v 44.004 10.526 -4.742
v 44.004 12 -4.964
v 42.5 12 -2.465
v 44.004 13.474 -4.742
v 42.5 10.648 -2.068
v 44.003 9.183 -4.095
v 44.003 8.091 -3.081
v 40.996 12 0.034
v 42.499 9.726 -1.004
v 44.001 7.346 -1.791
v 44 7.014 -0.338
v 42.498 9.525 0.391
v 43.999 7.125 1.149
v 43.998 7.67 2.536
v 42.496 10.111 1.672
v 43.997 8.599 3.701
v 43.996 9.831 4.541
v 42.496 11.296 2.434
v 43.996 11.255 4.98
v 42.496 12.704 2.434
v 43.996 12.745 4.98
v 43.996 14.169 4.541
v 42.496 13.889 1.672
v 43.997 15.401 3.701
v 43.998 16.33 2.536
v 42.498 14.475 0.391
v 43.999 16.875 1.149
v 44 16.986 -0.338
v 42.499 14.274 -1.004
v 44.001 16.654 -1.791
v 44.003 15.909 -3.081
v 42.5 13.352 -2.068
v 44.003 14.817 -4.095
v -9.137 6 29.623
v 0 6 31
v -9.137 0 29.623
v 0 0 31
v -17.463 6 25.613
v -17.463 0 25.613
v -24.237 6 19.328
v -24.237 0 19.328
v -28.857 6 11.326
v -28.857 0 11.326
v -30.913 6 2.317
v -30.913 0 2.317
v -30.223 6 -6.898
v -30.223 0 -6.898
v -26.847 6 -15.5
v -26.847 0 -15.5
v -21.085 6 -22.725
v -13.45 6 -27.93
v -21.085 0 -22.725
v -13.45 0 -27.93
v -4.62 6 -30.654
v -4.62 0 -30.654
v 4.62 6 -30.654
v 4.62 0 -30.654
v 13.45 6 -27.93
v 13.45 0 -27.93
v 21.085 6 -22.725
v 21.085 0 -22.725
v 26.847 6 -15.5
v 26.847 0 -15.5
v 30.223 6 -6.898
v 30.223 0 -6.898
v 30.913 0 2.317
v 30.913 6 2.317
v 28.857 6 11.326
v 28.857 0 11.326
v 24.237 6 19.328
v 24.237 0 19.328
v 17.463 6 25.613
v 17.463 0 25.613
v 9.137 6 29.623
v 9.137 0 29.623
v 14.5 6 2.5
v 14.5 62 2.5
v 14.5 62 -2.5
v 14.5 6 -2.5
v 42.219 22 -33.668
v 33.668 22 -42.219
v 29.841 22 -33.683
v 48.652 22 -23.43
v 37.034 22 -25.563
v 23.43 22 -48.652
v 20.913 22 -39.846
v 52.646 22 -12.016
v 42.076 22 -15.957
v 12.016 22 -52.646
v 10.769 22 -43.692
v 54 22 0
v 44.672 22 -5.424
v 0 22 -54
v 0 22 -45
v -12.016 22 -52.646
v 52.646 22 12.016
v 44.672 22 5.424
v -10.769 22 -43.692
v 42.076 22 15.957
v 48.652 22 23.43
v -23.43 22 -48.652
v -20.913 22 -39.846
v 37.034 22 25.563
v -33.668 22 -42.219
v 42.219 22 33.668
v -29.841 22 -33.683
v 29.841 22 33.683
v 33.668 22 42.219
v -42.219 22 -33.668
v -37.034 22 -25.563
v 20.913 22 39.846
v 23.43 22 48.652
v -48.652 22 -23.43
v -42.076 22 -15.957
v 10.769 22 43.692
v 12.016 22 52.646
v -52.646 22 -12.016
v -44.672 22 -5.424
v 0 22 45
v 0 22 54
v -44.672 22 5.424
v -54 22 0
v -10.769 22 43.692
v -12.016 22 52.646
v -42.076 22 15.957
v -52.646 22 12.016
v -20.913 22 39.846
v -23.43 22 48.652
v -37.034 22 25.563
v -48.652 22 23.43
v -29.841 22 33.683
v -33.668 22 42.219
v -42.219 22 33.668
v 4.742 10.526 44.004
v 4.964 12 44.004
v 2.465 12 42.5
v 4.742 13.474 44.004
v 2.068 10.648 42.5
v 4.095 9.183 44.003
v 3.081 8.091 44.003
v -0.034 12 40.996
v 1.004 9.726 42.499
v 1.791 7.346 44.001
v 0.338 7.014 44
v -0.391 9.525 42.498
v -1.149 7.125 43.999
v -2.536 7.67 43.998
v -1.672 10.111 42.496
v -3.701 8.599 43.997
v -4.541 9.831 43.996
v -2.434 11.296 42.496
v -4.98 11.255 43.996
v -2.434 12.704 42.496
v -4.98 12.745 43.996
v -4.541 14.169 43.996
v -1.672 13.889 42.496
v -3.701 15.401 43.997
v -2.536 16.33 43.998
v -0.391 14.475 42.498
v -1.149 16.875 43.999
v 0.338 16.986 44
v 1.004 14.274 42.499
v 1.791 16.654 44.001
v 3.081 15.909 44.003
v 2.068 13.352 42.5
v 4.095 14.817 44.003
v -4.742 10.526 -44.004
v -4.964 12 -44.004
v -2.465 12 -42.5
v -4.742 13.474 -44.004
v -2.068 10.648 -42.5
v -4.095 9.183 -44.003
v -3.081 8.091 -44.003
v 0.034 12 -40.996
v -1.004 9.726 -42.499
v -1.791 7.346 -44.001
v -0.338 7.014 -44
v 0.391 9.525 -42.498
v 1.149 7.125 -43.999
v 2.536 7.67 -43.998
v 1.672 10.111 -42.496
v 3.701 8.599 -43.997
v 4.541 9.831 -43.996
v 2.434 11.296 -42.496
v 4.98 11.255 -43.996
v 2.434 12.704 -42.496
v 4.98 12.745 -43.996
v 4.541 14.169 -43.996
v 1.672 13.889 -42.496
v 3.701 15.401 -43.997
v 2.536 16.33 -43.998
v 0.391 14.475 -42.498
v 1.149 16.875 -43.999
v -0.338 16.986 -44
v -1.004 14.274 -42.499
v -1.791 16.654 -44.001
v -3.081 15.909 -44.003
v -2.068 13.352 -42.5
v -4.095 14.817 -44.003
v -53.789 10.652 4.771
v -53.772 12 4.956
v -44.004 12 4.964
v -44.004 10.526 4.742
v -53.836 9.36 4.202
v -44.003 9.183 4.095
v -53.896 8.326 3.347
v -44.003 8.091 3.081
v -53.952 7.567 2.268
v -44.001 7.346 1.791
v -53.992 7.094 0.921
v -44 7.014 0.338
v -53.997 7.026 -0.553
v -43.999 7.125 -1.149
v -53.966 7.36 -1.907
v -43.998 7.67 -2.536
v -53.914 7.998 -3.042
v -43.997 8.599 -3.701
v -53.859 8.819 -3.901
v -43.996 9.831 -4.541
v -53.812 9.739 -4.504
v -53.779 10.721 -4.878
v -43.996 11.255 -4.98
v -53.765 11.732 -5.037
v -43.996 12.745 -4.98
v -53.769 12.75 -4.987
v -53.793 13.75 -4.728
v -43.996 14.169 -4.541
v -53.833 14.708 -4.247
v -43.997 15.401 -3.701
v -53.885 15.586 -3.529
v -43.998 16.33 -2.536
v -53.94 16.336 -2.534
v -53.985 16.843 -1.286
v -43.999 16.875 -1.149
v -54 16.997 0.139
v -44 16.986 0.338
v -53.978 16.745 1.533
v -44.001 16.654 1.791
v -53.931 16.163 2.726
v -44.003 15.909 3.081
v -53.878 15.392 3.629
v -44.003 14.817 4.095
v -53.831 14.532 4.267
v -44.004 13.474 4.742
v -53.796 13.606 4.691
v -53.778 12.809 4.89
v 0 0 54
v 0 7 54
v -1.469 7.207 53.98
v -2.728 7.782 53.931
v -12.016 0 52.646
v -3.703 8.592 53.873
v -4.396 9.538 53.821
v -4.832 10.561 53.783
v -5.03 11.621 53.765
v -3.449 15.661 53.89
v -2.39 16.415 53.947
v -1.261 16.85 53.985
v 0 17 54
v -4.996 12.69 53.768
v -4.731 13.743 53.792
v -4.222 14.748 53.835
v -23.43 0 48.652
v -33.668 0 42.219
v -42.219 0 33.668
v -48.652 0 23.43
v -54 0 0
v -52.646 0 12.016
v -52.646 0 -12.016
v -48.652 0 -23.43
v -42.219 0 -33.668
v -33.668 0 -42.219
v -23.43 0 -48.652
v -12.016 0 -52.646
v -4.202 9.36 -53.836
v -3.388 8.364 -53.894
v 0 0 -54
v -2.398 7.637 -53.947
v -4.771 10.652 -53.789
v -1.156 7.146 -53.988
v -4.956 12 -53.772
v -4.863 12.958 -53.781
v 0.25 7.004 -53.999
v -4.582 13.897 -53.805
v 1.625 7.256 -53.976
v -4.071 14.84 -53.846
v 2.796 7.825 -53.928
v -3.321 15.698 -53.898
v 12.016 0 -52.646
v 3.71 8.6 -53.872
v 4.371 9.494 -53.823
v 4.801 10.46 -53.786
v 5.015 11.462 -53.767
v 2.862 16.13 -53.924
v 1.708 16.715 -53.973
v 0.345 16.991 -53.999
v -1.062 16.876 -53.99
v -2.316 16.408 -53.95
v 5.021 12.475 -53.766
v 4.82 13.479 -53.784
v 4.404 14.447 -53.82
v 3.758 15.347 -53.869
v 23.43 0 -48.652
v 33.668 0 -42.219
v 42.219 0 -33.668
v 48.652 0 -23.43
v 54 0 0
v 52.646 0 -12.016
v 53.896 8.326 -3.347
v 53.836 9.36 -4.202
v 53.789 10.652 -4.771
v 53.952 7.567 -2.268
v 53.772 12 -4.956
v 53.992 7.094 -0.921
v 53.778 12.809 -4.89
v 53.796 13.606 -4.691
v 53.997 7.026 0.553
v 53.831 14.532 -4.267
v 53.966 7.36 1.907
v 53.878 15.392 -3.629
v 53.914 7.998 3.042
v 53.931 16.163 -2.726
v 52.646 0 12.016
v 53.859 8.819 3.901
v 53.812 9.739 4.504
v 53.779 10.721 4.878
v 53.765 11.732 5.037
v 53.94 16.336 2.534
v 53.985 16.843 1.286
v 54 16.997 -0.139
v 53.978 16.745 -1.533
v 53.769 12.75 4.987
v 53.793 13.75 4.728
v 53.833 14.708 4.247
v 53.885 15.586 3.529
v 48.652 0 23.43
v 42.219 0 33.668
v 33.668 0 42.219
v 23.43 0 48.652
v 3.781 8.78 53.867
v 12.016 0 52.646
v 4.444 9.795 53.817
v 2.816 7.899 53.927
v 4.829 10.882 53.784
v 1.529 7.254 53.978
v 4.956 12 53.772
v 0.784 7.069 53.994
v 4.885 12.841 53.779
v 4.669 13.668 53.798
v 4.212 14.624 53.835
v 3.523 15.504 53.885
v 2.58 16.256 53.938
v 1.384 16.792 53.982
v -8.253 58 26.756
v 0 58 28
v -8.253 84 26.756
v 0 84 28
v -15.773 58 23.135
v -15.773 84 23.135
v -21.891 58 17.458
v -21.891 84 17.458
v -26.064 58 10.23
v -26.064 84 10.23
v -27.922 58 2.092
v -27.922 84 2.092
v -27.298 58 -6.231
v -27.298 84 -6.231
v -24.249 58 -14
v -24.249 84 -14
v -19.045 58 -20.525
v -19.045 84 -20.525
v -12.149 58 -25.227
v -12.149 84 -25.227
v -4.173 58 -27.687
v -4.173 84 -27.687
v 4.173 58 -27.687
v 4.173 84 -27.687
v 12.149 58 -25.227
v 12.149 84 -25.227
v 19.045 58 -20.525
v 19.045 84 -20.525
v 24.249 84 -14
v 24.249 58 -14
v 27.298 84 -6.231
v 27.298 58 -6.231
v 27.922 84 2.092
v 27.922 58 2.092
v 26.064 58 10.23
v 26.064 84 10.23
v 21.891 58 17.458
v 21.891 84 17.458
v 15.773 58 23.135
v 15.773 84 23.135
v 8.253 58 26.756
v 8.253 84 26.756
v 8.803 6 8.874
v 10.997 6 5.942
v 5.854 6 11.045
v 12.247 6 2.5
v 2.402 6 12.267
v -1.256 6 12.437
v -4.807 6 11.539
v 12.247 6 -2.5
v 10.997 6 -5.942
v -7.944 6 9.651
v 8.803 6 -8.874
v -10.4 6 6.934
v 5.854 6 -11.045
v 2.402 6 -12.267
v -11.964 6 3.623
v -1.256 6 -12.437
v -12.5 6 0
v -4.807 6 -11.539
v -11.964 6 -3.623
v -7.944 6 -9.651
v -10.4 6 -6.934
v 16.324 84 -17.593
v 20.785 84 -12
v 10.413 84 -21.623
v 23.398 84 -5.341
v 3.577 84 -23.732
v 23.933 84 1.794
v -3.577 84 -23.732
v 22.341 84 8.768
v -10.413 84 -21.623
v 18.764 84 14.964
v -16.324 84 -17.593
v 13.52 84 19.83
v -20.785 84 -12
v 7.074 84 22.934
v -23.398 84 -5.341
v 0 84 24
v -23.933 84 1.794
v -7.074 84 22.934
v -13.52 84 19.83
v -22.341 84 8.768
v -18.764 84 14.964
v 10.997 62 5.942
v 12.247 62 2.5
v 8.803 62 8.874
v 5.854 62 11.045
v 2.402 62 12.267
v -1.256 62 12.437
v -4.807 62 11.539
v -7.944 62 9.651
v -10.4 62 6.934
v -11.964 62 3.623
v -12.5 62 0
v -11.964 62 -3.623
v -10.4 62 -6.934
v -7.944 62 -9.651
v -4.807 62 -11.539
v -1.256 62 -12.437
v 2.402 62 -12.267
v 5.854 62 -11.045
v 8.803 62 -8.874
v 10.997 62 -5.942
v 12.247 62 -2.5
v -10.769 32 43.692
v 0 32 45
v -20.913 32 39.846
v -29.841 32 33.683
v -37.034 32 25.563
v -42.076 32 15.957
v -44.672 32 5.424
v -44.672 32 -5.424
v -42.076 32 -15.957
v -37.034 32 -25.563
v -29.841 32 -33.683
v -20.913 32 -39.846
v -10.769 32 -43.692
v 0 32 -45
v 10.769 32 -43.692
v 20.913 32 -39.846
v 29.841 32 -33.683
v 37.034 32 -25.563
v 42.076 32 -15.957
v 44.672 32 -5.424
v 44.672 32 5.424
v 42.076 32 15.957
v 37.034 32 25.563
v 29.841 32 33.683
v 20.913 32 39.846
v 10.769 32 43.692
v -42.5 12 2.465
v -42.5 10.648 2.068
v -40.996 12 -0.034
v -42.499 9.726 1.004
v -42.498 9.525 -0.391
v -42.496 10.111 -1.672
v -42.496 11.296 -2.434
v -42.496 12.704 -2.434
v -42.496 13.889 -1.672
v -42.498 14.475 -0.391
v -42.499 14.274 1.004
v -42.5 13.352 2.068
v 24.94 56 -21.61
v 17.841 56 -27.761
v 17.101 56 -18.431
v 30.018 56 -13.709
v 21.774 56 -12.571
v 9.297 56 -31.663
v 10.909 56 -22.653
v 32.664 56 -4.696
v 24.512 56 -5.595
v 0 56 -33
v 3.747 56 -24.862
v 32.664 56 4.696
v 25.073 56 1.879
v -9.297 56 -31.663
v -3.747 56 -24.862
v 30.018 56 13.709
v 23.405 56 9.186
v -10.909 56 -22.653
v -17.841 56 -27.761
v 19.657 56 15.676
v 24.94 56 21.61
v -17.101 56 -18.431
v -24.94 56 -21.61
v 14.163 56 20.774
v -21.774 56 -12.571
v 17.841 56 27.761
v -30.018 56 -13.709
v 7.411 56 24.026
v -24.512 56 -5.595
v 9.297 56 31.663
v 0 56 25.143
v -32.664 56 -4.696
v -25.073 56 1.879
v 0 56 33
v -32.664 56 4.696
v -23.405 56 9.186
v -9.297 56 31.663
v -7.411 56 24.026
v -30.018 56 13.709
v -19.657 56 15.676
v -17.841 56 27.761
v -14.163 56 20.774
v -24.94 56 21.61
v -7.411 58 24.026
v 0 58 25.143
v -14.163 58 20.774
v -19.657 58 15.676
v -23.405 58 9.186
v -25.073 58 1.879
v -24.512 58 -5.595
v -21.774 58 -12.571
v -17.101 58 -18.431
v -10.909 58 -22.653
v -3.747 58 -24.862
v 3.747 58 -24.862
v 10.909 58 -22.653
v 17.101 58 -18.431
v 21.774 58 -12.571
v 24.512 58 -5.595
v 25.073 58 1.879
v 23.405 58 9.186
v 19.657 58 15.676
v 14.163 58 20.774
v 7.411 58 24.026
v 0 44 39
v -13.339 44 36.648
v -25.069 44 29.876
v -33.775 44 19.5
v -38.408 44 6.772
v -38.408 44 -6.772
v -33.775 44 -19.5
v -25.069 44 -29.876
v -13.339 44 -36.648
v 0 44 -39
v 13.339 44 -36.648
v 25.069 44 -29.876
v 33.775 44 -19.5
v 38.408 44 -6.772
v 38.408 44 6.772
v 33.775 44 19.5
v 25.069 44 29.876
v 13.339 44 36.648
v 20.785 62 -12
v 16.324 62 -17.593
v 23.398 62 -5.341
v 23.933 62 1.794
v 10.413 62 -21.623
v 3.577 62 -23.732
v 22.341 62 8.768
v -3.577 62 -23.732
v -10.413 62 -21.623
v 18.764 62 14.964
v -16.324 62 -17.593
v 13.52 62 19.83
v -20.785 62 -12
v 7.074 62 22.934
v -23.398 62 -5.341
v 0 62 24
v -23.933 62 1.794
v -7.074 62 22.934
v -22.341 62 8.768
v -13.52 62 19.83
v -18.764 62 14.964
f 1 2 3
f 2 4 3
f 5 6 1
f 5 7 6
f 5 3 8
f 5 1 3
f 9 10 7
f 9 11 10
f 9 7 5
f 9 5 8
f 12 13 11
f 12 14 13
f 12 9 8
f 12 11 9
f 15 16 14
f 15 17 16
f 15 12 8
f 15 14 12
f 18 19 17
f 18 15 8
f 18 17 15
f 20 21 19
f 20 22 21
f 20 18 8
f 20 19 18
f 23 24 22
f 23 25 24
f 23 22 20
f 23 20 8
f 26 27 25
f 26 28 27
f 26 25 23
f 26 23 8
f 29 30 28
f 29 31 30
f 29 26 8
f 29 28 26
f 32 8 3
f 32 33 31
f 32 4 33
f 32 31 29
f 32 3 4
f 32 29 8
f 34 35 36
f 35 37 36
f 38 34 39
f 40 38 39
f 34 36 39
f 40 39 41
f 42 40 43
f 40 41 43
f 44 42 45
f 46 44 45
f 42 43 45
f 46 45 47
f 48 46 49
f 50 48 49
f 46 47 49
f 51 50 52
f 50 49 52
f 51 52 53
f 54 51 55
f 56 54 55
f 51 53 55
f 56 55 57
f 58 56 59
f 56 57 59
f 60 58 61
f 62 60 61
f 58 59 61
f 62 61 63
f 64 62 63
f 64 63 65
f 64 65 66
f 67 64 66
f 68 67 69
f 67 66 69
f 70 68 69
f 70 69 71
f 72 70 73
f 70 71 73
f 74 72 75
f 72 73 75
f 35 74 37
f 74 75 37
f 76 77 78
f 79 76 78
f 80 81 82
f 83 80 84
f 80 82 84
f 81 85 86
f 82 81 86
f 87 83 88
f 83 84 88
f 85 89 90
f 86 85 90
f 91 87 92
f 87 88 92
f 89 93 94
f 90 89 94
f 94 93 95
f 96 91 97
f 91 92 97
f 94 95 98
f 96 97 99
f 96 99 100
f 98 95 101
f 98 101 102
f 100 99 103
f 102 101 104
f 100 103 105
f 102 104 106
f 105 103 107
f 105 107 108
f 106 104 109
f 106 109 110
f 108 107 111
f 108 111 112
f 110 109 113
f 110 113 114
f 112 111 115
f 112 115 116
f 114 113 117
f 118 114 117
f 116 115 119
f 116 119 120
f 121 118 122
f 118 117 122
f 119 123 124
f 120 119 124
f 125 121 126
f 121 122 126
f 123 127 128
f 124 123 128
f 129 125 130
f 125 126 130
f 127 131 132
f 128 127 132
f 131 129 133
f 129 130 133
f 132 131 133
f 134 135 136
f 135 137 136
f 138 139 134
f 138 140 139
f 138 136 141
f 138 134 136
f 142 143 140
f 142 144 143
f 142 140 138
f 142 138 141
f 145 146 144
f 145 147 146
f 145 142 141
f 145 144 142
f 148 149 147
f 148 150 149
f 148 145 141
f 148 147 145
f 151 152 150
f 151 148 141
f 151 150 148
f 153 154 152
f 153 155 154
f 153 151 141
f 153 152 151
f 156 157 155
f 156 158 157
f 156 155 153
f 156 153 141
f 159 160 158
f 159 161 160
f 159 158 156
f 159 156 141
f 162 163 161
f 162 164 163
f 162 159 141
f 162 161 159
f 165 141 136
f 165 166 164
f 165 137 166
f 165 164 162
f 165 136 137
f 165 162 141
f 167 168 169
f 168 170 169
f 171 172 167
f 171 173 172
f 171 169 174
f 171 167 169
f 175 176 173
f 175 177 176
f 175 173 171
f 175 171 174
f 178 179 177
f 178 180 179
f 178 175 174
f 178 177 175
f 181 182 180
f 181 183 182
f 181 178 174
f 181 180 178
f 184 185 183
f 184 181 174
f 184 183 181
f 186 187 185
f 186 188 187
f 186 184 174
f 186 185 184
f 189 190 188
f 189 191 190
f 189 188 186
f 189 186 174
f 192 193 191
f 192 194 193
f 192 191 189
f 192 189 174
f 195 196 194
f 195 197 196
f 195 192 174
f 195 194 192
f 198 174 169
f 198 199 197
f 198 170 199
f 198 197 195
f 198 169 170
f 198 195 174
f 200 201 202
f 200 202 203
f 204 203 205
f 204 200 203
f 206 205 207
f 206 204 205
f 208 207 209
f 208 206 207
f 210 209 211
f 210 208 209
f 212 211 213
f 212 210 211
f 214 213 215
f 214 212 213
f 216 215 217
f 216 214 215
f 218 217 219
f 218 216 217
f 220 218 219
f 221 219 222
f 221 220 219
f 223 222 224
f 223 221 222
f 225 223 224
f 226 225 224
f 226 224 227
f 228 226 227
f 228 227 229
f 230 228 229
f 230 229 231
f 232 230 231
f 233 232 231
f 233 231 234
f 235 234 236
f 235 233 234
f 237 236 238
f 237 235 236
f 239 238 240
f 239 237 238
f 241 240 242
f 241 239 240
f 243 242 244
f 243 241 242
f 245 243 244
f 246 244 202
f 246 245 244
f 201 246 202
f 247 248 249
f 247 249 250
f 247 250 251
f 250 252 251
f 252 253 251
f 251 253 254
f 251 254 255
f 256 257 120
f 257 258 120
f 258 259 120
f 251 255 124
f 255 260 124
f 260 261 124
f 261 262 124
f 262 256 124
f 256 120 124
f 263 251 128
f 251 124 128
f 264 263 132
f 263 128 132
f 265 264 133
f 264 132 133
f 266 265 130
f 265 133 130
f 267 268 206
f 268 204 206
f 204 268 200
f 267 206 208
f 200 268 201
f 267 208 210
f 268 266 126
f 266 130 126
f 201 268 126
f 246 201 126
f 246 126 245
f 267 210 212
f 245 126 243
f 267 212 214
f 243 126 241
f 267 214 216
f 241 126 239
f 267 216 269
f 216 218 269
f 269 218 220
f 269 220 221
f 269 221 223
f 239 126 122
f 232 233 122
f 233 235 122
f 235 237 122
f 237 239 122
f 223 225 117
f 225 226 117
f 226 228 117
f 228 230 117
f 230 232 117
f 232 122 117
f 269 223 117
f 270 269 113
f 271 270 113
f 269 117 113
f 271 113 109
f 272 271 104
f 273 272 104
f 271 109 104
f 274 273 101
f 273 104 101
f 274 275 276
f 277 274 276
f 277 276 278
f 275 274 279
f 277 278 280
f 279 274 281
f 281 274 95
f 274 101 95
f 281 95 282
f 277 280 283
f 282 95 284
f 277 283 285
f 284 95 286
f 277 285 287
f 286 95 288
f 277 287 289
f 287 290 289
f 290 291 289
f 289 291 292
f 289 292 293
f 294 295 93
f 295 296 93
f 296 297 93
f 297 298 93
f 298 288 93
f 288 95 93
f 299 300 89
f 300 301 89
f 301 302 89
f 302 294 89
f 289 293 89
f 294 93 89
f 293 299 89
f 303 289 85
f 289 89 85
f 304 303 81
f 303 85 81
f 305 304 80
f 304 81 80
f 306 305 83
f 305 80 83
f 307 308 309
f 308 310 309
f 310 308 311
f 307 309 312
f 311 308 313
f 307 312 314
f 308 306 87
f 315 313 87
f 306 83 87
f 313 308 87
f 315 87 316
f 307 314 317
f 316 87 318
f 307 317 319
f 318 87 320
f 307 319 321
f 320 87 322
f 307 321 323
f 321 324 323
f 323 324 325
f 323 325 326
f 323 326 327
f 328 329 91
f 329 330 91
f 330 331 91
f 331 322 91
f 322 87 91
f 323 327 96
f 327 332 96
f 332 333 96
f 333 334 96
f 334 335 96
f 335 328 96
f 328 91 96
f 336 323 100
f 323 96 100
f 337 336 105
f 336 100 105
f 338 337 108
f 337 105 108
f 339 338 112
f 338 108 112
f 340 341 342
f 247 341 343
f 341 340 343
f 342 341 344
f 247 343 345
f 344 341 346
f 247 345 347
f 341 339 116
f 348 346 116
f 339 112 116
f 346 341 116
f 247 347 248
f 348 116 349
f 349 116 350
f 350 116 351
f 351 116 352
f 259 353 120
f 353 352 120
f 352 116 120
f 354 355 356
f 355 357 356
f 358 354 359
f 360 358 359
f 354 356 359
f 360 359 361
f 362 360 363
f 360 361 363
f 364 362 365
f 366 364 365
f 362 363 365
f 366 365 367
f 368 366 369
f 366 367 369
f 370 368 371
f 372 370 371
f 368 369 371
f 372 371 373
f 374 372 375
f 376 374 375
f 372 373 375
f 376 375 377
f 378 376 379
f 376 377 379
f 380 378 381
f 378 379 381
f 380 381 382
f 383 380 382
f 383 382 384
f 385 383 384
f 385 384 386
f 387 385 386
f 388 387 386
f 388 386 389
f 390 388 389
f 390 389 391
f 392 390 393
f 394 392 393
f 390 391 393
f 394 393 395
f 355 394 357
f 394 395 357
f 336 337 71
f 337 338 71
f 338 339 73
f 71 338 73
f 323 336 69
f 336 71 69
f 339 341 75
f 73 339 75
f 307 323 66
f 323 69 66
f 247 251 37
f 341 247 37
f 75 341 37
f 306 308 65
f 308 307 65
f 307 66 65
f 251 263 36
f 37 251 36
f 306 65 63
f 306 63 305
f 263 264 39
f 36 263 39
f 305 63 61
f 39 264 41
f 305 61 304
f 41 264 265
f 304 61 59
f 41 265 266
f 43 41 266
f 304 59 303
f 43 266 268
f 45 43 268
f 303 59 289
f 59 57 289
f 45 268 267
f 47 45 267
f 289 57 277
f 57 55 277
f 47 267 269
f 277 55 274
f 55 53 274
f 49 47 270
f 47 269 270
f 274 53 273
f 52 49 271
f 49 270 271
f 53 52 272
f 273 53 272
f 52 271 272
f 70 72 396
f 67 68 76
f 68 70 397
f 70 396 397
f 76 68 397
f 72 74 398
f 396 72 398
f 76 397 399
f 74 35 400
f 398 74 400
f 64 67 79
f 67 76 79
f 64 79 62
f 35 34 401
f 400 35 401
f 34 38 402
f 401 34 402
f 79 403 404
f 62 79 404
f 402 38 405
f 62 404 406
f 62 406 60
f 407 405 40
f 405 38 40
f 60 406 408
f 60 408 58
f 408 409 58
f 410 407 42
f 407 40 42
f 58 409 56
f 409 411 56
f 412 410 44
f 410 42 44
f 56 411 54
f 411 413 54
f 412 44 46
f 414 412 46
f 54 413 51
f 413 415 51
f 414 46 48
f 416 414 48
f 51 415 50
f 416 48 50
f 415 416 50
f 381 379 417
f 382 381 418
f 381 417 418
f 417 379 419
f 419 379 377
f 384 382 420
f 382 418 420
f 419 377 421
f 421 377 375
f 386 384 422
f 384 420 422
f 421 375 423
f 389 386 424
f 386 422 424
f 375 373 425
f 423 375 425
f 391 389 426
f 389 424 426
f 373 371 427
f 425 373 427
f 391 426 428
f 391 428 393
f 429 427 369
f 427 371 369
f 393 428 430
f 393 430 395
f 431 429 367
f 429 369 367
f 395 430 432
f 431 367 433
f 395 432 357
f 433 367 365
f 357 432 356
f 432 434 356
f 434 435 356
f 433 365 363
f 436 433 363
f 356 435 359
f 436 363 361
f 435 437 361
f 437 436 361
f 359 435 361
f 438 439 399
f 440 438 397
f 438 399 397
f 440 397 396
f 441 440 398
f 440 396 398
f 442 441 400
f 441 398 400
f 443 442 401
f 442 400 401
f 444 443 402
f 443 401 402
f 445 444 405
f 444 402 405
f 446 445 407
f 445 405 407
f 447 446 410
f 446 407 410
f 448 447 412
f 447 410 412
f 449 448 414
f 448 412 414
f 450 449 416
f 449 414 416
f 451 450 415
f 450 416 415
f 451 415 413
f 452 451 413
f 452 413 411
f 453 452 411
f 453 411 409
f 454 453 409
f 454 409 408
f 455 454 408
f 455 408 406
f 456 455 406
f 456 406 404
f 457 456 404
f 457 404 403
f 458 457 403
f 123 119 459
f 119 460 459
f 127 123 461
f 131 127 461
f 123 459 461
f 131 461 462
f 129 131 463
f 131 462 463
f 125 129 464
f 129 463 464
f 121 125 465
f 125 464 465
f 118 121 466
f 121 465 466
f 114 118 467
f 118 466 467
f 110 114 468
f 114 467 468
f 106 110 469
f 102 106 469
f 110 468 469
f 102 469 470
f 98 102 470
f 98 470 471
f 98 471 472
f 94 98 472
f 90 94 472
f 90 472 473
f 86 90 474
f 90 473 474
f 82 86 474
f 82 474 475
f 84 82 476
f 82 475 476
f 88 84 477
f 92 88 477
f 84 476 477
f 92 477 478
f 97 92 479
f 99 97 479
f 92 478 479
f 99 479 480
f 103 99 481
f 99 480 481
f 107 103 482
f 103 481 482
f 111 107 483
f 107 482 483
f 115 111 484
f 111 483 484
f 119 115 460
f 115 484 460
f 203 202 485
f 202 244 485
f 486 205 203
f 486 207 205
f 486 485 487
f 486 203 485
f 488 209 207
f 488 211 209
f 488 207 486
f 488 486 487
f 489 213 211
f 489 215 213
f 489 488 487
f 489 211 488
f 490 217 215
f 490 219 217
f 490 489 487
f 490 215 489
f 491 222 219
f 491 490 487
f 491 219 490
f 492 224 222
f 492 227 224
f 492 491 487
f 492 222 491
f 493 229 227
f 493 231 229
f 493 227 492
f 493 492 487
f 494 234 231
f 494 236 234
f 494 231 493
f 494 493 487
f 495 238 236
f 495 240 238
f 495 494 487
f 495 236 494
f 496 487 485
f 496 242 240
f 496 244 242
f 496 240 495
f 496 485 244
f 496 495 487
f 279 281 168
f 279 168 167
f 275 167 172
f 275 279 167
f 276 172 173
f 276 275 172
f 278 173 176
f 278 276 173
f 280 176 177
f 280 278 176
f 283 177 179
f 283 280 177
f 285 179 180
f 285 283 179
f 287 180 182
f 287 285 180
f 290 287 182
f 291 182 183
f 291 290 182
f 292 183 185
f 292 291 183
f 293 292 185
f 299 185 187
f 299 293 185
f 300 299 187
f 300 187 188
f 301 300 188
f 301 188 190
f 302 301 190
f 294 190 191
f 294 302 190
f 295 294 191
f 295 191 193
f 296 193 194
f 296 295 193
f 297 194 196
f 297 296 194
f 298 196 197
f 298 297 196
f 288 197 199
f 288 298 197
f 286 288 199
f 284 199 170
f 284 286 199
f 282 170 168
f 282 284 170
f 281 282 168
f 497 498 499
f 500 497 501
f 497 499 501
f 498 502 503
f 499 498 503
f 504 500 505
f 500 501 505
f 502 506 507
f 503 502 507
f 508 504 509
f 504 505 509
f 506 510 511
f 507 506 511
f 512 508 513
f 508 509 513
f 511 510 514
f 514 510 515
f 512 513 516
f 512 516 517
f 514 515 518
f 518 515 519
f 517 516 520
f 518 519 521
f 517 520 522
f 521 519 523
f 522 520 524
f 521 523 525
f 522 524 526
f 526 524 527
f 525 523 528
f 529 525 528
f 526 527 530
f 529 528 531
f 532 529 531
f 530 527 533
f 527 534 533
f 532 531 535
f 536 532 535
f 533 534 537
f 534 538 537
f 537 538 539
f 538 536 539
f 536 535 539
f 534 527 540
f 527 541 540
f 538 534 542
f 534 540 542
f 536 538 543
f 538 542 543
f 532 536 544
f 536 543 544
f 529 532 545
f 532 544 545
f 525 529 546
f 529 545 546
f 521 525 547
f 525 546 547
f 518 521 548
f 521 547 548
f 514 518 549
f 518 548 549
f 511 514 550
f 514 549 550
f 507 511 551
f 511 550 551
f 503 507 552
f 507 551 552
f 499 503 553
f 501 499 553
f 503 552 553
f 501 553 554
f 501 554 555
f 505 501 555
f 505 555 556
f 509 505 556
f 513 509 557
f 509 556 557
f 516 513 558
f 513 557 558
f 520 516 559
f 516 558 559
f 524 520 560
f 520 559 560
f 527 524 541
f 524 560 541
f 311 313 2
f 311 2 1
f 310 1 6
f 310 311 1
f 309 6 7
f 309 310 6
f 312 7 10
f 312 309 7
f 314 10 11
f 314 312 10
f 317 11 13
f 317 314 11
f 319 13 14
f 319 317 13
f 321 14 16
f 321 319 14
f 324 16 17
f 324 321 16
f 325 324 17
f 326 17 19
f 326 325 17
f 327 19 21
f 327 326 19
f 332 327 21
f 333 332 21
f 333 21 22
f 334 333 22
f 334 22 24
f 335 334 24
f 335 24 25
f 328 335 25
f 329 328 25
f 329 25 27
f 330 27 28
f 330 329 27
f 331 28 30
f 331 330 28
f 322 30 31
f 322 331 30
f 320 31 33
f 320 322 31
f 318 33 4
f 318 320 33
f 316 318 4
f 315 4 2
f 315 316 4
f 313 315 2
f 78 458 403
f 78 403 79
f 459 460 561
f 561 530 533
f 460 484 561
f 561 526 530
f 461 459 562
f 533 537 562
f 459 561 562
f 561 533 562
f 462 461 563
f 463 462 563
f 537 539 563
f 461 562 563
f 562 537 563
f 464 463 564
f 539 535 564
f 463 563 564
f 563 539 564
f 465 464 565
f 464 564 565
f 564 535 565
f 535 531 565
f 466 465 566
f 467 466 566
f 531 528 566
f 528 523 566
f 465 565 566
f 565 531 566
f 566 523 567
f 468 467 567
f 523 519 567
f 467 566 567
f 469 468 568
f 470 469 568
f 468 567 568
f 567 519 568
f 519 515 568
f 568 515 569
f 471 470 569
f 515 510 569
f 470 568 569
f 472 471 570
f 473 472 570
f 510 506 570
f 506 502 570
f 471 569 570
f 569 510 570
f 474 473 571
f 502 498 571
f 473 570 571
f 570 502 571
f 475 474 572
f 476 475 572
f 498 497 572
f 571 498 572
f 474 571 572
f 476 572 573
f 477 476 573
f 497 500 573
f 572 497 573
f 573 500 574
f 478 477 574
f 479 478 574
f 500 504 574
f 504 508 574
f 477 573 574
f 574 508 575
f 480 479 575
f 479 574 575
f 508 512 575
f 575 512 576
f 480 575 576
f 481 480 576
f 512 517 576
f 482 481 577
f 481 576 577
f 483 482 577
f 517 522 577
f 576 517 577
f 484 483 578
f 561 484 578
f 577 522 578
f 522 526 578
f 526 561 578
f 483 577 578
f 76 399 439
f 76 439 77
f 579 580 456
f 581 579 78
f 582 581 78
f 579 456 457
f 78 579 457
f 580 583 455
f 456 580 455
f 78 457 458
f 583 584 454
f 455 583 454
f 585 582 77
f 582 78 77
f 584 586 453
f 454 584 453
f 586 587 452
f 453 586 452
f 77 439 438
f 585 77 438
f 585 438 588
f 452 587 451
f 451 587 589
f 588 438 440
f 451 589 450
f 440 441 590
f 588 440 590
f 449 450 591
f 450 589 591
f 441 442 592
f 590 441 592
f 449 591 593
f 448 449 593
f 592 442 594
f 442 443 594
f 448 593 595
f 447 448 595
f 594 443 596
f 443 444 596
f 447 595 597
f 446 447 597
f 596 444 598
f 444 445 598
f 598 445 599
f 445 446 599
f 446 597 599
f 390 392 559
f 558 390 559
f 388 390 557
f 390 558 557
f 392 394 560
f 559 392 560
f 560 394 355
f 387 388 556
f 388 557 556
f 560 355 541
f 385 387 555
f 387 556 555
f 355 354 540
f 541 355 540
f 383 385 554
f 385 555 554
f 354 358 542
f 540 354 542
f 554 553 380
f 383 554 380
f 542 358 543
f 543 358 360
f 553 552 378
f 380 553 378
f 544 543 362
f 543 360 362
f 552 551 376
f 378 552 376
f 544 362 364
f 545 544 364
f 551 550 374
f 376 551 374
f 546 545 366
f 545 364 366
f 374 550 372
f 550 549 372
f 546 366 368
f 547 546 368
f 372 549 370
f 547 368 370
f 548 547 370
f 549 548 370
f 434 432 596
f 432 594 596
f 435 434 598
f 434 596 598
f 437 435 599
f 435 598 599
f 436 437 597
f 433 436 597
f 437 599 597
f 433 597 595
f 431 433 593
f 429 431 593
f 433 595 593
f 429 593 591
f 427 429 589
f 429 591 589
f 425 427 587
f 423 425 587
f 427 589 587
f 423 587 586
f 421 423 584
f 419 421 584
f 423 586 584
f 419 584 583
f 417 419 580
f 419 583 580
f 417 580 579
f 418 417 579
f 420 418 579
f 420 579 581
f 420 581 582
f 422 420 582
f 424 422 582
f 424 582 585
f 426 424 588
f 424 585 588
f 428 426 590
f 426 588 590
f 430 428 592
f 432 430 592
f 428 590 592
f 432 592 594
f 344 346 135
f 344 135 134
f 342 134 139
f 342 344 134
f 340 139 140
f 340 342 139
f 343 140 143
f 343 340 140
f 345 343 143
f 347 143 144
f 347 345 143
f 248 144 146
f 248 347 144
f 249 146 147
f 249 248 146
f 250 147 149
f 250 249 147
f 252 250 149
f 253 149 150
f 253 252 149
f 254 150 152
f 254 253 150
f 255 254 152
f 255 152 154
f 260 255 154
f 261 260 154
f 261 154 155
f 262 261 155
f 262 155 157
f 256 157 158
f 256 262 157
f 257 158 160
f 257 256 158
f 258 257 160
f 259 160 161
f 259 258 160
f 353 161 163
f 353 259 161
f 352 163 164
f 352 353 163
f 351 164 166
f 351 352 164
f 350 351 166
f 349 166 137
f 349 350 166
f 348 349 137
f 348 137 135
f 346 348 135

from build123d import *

# Parameters (mm, degrees)
SKETCH2_W          = 3.901140831
SKETCH2_H          = 5
CUT_EXTRUDE1_DEPTH = 99.366661019
CIRPATTERN1_COUNT  = 4


with BuildPart() as part:
    # Sketch1 → Revolve1 (revolve)
    with BuildSketch(Plane.XY, mode=Mode.PRIVATE) as revolve1_sk:
        Polygon((24, 84), (24, 62), (12.5, 62), (12.5, 6), (31, 6), (31, 0), (54, 0), (54, 22), (45, 22), (45, 32), (33, 56), (25.142857143, 56), (25.142857143, 58), (28, 58), (28, 84), align=None)
    revolve(revolve1_sk.sketch.rotate(Axis((0, 70.99827883, 0), (0, -1, 0)), 90), axis=Axis((0, 70.99827883, 0), (0, -1, 0)))

    # Sketch2 → Cut-Extrude1 (cut, through all)
    with BuildSketch(Plane(origin=(0, 62, 0), x_dir=(1, 0, 0), z_dir=(0, 1, 0))):
        with Locations((12.549429585, 0)):
            Rectangle(SKETCH2_W, SKETCH2_H)
    extrude(amount=-CUT_EXTRUDE1_DEPTH, mode=Mode.SUBTRACT)

    # Sketch10 → Ø10.0 (10) Diameter Hole1 (revolve, cut)
    with BuildSketch(Plane(origin=(-0.044253974, 12, 53.999981867), x_dir=(0.99999966419503, 0, 0.0008195180458038231), z_dir=(0, 1, 0))):
        Polygon((0, 0), (0, 13.004303095), (5, 10), (5, 0), align=None)
    f_10_0_10_diameter_hole1 = revolve(axis=Axis((-0.049457914, 12, 60.349979734), (0.000819518045803823, 0, -0.99999966419503)), mode=Mode.SUBTRACT)

    # CirPattern1: Ø10.0 (10) Diameter Hole1 ×4 about axis
    cirpattern1_axis = Axis((0, 0, 0), (0, 1, 0))
    for i in range(1, CIRPATTERN1_COUNT):
        add(f_10_0_10_diameter_hole1.rotate(cirpattern1_axis, i * 360 / CIRPATTERN1_COUNT), mode=Mode.SUBTRACT)


solid = part.part
